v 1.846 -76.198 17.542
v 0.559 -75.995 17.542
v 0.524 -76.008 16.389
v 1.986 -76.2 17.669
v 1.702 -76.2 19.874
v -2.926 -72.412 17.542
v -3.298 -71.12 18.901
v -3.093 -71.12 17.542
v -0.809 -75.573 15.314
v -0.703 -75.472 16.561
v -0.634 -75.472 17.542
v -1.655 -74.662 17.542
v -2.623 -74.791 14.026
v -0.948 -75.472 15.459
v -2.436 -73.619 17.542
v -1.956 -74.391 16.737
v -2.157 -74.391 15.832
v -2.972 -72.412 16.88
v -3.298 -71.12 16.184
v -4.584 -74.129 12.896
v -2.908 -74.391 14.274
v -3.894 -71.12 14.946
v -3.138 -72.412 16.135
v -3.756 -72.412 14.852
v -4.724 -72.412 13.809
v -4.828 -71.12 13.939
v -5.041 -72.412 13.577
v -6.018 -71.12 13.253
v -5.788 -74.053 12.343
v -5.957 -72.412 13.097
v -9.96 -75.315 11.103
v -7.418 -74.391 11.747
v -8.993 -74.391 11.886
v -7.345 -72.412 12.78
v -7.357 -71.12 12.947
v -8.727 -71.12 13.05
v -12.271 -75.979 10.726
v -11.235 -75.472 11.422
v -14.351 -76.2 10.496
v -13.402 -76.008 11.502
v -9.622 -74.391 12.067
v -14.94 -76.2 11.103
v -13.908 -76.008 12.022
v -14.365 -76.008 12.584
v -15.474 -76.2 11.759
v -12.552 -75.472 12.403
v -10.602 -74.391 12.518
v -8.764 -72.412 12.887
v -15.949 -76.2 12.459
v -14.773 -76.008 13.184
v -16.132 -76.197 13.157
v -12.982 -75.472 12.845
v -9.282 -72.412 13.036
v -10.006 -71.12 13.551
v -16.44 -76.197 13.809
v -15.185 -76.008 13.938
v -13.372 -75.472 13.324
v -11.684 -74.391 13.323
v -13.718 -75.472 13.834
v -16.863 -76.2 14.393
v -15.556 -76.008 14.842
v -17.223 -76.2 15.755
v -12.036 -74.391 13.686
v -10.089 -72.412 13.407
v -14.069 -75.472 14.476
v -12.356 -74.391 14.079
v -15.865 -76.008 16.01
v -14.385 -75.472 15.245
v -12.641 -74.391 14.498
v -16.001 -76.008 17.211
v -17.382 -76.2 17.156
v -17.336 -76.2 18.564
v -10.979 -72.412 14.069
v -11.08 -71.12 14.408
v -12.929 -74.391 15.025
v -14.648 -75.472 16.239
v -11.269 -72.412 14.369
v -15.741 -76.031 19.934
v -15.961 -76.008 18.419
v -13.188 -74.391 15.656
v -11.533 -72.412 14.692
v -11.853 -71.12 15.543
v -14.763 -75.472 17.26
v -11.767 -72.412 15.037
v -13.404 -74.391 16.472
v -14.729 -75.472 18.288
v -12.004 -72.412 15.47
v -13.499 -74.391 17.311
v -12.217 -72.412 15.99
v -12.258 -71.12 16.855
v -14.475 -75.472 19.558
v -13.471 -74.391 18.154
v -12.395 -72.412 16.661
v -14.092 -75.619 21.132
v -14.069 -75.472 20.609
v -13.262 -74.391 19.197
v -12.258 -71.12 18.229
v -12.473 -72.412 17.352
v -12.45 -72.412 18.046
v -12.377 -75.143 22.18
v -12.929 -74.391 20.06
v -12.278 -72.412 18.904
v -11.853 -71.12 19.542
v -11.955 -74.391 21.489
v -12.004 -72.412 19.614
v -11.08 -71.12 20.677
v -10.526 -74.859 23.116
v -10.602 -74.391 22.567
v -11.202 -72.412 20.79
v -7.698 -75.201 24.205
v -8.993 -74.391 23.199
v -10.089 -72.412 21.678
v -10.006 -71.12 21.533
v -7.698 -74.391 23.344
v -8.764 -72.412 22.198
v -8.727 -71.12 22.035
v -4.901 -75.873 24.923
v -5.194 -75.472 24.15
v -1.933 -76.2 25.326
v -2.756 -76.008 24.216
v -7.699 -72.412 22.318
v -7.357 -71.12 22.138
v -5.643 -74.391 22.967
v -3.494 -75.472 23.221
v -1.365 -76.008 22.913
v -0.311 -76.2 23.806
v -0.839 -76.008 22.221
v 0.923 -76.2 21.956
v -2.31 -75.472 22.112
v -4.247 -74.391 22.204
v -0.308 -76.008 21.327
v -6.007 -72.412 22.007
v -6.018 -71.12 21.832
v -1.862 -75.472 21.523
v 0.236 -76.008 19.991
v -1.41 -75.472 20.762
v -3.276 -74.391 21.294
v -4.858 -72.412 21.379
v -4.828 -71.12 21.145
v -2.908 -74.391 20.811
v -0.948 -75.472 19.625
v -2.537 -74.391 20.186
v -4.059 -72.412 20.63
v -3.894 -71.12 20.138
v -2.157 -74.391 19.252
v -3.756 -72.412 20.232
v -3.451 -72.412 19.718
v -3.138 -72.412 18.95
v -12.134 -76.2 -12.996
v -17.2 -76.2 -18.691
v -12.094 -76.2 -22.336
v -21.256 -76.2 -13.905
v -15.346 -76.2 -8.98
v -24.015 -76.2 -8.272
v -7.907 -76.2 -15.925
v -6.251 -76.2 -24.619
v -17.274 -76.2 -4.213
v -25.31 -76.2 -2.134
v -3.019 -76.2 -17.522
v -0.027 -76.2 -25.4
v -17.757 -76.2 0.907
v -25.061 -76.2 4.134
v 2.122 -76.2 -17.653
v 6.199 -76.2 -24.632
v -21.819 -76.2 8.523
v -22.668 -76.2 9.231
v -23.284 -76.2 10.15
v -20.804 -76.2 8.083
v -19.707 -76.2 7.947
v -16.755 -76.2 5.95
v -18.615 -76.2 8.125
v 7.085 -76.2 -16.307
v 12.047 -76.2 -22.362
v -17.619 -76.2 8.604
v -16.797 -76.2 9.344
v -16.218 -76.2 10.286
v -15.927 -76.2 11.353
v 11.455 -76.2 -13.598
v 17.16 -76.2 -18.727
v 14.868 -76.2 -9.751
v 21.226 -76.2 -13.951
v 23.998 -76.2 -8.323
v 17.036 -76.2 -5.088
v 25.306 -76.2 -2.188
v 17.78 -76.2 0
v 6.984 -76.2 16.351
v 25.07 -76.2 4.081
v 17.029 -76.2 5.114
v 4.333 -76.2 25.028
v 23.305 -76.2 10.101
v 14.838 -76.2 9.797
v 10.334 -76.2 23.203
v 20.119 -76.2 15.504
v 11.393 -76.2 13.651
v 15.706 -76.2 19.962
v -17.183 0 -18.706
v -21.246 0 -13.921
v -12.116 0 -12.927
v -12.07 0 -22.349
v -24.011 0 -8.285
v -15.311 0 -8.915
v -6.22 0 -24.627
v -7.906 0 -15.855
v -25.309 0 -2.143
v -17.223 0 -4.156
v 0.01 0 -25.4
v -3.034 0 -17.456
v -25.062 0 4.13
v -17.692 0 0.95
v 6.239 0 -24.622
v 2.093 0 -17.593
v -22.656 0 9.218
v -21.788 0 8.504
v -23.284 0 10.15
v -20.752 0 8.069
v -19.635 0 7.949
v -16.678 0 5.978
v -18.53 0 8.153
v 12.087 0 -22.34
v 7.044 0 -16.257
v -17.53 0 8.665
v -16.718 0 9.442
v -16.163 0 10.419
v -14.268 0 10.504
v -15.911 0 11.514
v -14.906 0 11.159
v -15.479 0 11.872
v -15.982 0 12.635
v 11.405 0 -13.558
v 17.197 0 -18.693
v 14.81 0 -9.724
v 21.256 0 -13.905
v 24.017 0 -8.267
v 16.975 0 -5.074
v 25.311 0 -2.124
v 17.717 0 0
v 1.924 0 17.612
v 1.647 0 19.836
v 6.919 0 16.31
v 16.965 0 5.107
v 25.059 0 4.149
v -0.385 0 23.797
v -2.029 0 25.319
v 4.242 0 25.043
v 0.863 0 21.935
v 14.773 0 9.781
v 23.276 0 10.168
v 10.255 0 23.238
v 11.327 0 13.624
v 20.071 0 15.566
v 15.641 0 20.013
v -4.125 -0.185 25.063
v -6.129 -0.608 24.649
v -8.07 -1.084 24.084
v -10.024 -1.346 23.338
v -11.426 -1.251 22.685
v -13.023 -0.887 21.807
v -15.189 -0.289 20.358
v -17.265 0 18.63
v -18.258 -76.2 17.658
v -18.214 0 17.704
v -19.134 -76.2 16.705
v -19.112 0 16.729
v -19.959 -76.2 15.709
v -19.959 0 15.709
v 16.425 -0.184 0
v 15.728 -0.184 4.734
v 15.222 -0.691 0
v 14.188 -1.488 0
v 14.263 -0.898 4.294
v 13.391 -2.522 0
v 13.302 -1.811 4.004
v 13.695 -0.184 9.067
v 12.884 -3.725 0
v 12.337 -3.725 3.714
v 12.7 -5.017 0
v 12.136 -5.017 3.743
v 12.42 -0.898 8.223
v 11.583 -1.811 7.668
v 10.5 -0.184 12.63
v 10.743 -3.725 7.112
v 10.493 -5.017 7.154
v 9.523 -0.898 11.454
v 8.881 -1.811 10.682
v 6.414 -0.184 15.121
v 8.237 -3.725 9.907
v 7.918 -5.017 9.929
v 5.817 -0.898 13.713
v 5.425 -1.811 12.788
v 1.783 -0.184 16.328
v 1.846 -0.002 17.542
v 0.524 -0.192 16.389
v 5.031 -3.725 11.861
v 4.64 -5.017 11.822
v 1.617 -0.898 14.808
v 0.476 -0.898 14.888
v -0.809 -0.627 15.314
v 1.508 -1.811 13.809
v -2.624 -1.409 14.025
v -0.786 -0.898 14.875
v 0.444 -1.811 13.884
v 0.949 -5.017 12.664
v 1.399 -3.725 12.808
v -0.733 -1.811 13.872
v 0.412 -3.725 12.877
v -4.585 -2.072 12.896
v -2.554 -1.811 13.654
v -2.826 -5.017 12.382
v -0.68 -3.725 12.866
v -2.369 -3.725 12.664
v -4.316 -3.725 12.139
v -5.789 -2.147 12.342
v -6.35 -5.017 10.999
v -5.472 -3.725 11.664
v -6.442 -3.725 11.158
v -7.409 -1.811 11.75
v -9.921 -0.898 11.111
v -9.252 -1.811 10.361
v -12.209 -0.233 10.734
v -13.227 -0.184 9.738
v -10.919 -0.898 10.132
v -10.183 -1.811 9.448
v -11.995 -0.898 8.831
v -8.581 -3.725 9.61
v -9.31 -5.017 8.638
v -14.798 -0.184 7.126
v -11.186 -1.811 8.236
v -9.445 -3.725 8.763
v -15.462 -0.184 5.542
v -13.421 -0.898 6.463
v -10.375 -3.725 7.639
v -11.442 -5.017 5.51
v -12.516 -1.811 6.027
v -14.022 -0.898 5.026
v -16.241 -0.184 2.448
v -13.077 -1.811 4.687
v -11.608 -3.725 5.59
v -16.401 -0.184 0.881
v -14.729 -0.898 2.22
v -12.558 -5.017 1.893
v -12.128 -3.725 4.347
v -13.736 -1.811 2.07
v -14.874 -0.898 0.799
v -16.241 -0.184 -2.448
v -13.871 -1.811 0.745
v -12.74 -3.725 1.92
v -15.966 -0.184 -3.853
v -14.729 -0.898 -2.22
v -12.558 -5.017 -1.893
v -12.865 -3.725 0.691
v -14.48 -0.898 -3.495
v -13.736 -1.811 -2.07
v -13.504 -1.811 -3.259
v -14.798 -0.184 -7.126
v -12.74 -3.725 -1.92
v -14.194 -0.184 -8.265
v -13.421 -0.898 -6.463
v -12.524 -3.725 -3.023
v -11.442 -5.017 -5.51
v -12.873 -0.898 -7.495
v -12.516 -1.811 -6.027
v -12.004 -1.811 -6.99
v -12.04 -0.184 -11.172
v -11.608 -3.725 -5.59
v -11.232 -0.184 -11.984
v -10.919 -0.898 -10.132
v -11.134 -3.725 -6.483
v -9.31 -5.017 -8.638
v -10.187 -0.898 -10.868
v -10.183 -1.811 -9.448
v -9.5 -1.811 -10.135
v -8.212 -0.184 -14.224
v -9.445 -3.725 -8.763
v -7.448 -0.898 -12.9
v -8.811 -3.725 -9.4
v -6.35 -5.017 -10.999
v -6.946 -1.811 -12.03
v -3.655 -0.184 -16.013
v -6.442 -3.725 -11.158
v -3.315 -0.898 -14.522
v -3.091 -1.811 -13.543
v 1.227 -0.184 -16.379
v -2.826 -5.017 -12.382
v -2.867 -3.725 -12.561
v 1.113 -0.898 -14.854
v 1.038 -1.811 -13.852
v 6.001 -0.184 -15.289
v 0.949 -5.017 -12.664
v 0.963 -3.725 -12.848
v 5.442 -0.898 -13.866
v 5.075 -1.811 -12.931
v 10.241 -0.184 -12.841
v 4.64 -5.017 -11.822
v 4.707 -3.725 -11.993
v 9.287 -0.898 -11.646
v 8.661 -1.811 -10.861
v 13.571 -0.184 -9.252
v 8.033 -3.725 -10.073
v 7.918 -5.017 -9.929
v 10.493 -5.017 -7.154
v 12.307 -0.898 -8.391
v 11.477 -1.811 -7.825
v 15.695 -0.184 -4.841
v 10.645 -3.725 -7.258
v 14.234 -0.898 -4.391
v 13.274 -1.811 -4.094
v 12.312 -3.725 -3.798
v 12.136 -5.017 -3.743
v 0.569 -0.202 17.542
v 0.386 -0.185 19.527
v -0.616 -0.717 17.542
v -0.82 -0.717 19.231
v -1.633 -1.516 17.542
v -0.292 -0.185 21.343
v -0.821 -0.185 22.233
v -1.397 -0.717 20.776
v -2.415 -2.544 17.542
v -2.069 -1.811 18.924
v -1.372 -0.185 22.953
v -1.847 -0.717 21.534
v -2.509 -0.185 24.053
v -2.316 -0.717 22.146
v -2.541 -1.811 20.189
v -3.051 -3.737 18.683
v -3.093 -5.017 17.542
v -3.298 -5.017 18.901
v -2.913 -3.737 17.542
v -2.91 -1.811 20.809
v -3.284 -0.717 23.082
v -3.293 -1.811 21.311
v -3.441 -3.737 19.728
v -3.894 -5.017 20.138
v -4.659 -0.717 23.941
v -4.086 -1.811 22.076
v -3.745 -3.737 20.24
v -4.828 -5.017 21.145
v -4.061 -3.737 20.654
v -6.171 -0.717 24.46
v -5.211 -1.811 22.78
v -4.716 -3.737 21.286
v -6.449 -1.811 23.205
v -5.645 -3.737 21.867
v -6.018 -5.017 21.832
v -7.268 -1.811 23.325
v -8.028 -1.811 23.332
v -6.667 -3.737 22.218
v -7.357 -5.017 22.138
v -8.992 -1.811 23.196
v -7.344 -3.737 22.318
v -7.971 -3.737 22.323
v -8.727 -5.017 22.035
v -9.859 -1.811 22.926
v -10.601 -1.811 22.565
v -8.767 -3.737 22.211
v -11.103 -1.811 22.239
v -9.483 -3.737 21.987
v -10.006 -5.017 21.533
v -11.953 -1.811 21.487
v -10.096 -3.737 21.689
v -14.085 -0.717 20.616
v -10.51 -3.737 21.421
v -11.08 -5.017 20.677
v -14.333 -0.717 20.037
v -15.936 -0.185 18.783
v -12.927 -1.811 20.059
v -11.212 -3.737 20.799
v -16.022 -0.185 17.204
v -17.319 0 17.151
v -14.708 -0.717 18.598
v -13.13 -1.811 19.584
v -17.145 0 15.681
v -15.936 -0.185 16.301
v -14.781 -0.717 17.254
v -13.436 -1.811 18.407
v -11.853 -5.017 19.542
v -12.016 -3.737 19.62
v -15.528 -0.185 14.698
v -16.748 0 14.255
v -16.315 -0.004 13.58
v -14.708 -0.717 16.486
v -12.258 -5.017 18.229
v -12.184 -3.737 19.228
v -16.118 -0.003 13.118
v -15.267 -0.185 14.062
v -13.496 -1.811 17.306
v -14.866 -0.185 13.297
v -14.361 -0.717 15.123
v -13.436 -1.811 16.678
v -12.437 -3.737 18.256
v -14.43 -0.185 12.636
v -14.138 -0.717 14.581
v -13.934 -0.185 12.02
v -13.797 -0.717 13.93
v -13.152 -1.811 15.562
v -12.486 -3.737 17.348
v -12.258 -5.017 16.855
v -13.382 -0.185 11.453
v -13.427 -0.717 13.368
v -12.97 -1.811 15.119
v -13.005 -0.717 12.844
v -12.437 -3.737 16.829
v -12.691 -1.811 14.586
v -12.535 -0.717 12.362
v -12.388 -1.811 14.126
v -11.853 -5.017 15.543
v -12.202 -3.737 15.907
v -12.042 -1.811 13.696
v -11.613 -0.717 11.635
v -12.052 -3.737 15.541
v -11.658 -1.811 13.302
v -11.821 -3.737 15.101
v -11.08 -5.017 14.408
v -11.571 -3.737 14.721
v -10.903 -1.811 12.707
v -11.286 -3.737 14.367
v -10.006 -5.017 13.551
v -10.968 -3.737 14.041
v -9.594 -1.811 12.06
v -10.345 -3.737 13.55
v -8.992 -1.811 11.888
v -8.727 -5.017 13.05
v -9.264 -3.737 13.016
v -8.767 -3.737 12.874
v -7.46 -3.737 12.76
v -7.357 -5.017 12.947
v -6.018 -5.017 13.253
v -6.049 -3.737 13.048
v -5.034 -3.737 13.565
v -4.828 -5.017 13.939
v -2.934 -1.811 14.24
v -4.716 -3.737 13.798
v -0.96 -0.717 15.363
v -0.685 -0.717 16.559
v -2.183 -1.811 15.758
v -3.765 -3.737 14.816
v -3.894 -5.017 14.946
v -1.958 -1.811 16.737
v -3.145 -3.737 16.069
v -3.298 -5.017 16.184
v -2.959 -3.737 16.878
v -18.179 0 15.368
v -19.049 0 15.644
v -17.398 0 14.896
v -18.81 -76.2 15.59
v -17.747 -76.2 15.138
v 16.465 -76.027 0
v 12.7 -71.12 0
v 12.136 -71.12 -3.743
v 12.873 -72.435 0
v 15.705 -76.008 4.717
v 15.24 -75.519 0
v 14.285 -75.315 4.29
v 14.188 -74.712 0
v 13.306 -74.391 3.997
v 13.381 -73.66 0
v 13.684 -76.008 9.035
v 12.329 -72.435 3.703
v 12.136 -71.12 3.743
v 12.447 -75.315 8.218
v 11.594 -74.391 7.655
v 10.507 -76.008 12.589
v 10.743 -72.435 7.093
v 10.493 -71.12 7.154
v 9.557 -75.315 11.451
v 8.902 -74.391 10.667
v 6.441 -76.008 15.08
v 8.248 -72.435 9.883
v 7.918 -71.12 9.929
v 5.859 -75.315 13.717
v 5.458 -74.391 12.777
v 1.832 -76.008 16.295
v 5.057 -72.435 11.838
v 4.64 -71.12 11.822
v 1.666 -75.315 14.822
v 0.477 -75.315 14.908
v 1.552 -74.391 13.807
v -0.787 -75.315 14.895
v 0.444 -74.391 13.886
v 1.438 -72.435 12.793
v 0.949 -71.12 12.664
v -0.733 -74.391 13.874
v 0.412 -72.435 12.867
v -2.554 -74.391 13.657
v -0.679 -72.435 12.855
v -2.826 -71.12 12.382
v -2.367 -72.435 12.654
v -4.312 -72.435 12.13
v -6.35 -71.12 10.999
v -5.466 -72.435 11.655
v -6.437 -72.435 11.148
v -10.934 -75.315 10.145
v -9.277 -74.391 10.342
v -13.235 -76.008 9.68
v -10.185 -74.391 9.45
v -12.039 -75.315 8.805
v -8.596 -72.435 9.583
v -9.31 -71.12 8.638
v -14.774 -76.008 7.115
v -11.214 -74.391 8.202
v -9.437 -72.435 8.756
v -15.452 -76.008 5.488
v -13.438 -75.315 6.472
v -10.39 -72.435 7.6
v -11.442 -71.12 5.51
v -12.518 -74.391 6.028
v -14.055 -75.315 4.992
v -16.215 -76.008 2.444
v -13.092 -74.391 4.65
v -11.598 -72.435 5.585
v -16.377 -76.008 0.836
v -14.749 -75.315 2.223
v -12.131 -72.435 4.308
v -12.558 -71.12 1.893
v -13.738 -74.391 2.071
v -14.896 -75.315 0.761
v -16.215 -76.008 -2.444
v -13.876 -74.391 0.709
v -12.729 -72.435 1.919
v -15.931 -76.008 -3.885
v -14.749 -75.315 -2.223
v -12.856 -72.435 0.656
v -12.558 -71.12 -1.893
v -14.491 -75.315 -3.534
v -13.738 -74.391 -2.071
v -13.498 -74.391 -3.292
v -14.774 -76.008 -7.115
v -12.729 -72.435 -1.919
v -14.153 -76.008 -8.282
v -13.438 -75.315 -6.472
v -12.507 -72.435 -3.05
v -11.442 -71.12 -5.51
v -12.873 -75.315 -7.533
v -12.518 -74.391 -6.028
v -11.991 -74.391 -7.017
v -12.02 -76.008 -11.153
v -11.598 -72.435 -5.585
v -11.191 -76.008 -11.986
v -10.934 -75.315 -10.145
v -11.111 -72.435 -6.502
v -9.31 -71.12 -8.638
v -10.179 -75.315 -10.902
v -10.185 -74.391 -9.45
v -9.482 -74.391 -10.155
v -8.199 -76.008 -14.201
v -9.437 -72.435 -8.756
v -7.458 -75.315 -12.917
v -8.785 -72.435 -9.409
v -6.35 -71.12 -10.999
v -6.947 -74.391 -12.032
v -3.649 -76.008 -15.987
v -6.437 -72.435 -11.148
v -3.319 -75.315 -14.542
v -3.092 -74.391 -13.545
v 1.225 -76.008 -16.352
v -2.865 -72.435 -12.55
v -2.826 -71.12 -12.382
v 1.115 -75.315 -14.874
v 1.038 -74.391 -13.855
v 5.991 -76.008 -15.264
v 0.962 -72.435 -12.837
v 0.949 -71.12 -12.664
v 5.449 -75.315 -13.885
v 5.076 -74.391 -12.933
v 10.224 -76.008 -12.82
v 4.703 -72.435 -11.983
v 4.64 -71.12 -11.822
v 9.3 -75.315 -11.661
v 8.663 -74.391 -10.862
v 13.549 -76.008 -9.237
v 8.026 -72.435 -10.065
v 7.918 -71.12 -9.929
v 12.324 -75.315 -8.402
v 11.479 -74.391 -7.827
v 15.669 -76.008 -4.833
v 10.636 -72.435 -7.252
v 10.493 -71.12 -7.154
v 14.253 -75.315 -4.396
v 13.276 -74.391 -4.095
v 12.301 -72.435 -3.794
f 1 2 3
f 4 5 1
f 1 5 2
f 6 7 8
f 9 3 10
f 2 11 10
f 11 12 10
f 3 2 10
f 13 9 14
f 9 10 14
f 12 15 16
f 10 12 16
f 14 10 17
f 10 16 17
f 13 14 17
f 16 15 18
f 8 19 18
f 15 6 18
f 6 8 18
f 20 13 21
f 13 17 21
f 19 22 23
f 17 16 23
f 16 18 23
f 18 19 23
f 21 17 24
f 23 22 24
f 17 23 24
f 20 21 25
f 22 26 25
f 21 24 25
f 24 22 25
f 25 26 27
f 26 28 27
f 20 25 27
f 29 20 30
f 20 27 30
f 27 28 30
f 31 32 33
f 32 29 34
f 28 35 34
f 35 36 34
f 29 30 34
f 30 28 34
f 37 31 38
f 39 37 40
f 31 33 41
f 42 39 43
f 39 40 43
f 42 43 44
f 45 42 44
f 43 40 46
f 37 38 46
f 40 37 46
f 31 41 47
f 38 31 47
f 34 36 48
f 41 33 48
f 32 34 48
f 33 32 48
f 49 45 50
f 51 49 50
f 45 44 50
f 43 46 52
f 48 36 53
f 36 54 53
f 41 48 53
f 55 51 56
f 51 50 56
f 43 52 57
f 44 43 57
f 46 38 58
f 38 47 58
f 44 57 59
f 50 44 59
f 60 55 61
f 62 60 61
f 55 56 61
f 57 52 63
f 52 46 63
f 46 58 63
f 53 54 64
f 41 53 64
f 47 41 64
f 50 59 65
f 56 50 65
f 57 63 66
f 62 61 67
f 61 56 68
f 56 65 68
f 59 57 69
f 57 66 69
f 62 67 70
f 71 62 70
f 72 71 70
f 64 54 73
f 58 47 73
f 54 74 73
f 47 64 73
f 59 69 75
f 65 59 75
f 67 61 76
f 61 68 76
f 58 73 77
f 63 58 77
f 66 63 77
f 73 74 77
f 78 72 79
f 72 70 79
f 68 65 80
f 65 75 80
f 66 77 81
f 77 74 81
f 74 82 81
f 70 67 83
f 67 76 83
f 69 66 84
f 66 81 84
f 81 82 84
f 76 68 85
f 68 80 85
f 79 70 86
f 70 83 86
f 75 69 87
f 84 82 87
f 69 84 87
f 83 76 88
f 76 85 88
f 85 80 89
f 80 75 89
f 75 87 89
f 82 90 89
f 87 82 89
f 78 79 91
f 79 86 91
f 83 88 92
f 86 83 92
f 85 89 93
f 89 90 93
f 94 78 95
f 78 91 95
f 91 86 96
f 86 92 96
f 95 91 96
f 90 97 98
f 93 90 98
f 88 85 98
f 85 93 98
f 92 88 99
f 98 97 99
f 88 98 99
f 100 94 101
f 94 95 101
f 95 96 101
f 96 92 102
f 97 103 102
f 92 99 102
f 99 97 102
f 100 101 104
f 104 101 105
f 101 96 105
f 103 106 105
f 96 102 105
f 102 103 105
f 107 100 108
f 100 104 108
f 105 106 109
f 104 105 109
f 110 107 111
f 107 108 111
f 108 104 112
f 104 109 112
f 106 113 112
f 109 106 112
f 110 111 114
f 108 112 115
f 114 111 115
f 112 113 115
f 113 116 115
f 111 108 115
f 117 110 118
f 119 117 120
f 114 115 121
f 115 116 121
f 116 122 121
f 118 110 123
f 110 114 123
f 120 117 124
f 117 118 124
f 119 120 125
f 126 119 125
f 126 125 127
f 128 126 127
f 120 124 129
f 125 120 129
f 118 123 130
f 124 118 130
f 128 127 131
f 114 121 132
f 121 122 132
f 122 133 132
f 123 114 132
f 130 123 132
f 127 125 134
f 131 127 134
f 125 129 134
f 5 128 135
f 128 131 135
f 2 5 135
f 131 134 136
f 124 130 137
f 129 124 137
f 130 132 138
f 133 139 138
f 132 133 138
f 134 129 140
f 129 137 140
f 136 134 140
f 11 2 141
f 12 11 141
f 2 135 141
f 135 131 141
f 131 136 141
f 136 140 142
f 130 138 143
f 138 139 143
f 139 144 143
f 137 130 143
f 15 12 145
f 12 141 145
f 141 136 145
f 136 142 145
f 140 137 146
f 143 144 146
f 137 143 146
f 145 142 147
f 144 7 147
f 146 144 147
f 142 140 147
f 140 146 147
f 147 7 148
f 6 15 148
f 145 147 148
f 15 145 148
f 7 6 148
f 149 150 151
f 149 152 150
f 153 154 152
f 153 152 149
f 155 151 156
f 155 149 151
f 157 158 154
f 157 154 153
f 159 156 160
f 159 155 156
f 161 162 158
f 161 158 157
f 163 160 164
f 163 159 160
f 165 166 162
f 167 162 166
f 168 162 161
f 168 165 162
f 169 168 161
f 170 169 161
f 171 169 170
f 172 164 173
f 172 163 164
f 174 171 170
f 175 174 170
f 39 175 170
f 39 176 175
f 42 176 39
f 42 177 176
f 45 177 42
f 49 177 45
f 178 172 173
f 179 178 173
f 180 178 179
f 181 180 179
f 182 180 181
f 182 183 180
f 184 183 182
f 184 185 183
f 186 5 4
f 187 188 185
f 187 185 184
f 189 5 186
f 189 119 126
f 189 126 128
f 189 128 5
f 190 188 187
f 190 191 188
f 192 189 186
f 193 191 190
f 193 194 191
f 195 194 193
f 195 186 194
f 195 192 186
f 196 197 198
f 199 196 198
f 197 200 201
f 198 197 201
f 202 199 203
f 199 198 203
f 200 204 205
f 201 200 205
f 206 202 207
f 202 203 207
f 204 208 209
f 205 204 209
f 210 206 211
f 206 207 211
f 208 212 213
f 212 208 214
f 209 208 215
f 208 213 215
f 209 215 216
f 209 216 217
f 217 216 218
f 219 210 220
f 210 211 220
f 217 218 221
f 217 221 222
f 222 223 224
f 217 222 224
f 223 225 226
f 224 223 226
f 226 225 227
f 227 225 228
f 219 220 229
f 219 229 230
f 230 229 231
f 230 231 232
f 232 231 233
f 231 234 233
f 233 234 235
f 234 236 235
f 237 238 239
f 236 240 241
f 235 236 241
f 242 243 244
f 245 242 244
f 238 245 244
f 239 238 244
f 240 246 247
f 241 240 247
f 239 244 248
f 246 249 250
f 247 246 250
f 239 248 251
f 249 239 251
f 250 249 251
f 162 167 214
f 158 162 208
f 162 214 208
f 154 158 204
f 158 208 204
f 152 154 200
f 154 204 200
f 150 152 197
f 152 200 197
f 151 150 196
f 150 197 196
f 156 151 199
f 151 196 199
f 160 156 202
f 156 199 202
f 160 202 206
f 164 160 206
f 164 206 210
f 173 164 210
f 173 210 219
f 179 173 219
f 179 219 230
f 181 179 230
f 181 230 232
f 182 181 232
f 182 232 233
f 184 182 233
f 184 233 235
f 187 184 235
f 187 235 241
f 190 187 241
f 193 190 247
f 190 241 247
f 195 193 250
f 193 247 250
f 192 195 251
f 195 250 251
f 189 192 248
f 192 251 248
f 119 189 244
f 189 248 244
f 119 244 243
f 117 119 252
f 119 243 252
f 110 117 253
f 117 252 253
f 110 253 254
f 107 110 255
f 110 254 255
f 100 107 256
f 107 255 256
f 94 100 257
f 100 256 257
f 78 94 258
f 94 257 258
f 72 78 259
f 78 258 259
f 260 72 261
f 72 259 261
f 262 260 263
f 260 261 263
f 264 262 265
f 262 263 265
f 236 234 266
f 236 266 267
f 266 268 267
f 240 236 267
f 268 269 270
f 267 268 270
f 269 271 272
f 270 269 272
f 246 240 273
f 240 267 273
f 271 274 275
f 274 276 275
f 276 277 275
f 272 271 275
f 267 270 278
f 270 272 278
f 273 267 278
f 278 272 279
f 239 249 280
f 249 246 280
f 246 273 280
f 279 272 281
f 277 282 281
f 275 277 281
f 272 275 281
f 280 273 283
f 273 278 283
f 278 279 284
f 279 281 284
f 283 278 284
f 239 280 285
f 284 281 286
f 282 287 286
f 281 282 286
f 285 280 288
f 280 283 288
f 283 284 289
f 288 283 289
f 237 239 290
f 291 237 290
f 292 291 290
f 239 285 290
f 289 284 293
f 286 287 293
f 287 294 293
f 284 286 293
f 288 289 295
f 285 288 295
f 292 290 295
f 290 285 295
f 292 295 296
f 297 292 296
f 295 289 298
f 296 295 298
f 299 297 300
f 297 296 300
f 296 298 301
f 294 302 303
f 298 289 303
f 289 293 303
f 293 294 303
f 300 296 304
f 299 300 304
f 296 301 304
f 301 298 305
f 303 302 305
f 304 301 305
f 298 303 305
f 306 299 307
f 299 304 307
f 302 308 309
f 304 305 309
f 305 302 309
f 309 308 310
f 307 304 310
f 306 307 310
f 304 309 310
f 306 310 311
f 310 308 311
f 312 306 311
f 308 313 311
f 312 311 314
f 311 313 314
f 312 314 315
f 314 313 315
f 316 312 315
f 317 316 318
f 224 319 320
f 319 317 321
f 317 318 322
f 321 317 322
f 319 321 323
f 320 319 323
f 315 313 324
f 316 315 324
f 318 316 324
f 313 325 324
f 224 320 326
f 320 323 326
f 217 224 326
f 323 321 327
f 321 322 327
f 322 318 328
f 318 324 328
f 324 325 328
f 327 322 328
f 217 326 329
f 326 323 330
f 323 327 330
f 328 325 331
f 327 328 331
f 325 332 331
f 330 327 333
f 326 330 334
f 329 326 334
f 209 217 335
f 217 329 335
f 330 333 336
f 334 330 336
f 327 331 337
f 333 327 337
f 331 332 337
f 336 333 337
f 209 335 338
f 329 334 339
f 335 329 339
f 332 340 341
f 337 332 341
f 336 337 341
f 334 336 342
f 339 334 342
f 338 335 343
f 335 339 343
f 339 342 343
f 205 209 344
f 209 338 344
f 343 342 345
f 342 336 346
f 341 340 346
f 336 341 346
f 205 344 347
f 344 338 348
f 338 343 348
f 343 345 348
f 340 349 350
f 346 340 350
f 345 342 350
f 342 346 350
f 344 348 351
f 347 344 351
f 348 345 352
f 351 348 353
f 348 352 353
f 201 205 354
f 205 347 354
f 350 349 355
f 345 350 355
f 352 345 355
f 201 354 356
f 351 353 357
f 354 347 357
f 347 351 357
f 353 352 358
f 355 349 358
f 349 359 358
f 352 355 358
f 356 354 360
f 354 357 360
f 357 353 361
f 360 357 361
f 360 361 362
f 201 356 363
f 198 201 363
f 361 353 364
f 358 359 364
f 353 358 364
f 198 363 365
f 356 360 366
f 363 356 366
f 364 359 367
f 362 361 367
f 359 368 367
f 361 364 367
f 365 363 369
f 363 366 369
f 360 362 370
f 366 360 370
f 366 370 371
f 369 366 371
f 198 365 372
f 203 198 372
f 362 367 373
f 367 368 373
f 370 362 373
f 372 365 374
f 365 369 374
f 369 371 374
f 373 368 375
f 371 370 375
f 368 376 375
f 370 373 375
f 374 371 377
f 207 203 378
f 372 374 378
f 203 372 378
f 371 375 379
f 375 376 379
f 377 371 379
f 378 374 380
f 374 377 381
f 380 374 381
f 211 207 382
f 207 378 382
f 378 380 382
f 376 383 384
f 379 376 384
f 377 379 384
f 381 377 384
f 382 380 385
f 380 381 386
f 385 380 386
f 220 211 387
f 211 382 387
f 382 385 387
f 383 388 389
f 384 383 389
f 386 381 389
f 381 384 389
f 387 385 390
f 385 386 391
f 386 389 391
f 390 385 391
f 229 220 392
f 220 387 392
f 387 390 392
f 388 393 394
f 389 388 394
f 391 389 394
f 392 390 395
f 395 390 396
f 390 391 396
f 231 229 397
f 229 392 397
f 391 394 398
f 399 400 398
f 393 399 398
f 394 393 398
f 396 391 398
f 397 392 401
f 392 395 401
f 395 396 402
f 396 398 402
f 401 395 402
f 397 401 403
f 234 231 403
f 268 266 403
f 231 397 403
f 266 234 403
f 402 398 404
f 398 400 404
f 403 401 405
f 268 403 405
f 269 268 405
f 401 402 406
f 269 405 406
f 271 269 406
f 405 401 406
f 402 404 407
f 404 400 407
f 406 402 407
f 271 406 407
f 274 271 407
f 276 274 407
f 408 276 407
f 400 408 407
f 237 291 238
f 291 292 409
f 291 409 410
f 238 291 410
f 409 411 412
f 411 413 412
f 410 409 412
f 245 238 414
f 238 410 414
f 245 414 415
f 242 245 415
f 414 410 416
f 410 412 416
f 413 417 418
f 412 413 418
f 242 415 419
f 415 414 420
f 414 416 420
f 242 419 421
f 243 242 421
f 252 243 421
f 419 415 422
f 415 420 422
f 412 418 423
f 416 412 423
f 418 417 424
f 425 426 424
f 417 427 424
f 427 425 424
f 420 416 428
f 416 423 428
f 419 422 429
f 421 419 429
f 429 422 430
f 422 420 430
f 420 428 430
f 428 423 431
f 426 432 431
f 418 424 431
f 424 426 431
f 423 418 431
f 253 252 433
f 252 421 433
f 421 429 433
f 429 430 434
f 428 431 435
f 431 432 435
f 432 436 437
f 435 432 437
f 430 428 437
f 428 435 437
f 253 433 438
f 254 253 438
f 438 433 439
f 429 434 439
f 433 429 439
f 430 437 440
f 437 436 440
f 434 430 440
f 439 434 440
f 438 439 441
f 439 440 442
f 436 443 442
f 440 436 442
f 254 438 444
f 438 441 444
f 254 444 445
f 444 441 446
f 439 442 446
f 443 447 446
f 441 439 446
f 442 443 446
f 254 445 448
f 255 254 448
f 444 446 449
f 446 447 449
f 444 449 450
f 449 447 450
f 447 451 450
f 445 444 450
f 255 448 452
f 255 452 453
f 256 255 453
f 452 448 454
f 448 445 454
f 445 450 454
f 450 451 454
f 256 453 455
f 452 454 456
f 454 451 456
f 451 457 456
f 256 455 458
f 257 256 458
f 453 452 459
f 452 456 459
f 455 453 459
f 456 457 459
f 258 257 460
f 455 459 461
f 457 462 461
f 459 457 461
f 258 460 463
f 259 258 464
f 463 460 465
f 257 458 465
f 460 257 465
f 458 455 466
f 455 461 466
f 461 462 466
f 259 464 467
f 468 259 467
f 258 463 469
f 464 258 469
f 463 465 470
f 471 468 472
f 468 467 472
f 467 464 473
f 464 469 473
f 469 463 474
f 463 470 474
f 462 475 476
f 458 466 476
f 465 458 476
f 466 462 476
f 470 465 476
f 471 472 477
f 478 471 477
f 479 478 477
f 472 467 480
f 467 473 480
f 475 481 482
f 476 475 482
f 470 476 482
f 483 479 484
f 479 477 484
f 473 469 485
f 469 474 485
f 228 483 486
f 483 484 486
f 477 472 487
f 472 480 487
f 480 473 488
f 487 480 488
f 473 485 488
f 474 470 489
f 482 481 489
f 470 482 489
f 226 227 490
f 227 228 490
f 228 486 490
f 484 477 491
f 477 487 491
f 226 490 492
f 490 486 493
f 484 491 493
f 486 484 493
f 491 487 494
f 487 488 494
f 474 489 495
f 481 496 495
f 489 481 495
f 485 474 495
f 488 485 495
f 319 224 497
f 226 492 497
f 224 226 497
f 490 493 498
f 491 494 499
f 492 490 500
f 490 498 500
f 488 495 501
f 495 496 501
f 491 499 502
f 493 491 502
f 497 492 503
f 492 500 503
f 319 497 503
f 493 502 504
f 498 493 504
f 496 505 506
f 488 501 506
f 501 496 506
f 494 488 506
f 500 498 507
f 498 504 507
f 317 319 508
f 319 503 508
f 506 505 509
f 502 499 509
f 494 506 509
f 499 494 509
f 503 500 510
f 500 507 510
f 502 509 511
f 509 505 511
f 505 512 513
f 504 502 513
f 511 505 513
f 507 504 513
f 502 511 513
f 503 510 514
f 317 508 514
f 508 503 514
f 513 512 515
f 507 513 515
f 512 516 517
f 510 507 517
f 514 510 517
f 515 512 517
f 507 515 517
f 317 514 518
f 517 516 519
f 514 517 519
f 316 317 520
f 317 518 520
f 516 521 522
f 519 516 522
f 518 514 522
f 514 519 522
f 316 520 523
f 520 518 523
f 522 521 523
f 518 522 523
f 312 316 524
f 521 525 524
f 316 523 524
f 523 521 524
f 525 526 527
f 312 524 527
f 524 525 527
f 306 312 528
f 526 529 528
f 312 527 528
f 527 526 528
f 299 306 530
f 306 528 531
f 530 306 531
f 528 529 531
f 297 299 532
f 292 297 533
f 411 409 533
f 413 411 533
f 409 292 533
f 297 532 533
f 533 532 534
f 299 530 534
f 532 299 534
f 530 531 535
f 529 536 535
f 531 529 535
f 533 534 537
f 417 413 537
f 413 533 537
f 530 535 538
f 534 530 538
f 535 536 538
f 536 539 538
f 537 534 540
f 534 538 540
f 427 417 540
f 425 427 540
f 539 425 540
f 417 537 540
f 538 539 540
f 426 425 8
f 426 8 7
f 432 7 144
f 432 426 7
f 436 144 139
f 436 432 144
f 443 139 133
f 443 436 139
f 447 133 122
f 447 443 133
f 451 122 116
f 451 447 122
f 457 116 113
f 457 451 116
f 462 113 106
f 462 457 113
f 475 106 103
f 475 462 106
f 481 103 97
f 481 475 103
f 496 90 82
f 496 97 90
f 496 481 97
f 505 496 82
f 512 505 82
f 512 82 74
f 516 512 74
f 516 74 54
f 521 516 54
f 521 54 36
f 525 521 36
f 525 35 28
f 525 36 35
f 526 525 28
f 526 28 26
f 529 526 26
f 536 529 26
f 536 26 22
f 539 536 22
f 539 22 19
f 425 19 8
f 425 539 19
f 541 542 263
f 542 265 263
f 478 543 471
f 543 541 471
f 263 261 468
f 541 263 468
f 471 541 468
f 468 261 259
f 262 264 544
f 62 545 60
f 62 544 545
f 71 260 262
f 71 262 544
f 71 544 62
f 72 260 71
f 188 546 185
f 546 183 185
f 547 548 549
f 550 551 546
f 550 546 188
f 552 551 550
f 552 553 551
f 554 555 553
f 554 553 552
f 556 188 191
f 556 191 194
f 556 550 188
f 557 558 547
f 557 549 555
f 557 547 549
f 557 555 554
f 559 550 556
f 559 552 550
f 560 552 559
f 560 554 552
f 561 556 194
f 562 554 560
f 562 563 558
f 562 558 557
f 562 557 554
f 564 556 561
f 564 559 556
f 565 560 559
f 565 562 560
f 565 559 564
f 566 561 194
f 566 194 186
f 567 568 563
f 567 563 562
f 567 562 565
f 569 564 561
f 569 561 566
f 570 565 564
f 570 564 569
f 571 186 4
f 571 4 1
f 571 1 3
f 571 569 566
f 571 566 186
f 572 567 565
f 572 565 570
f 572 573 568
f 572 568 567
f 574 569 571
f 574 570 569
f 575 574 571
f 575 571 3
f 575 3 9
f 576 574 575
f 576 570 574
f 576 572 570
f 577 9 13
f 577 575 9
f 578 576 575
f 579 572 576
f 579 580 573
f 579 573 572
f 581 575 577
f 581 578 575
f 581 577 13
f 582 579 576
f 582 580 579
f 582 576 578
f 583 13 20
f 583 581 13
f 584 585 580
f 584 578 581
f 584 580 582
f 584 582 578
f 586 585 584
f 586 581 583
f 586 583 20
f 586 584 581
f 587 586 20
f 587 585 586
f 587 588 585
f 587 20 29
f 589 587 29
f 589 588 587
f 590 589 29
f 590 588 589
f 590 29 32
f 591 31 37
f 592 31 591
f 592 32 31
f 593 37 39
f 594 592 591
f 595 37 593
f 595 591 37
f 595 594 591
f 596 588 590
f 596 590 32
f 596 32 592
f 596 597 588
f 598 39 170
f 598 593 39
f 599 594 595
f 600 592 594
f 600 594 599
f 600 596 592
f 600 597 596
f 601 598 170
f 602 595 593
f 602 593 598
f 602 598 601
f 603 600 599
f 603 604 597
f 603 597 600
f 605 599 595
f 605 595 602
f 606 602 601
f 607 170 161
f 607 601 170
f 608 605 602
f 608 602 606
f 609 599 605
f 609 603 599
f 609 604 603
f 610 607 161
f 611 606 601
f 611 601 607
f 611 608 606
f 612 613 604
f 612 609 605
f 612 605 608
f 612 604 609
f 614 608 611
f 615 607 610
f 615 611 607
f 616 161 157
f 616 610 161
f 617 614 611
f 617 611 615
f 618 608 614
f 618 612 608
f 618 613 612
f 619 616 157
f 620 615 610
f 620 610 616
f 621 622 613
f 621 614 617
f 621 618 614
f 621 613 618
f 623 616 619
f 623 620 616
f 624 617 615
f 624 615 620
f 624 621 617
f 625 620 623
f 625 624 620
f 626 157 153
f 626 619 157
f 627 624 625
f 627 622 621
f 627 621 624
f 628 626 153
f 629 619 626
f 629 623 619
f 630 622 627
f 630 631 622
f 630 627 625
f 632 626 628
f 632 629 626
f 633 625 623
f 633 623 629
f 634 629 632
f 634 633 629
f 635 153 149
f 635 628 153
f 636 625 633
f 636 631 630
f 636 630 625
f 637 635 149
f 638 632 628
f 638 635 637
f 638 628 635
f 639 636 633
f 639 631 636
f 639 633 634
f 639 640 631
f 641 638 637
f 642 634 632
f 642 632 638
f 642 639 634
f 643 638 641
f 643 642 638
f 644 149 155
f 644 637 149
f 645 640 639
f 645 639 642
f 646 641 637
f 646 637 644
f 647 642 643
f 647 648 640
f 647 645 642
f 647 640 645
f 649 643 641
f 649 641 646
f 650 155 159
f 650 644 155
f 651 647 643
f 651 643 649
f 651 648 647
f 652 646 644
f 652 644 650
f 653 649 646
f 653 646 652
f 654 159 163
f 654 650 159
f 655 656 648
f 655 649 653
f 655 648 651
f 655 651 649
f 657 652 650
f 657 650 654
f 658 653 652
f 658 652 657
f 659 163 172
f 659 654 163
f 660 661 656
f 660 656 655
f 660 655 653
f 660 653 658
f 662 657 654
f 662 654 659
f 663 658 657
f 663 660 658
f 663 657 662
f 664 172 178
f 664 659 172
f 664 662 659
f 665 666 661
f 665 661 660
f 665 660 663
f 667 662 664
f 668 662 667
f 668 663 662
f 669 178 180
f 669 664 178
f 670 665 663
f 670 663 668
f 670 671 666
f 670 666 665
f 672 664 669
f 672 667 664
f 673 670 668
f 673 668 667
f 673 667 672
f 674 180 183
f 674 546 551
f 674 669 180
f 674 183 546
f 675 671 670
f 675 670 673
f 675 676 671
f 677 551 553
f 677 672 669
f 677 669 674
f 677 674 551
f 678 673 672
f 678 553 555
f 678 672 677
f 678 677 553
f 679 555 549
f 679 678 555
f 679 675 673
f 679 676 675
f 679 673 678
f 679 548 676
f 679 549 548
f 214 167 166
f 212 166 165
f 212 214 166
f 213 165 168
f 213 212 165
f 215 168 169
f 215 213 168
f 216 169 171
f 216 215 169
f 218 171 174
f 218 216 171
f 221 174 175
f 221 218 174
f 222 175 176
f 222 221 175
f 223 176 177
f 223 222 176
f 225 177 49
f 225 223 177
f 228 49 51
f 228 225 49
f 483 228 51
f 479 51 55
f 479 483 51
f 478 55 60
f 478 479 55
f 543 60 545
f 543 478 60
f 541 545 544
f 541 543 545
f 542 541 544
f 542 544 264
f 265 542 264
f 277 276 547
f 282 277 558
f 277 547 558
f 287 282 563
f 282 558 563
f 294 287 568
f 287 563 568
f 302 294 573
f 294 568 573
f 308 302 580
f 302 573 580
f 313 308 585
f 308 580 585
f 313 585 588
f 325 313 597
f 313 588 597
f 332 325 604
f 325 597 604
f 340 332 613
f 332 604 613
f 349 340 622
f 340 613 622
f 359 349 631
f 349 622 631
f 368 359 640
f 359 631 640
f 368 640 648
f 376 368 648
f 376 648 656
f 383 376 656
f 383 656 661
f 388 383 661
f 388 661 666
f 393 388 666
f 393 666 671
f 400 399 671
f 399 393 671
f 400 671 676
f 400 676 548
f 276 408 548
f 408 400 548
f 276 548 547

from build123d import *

# Parameters (mm, degrees)
F0_R     = 25.4
F1_DEPTH = 76.2
F2_R     = 12.7
F3_DEPTH = 105.41
F4_R     = 3.8838784961
F5_DEPTH = 133.35
F6_R     = 4.6082025667
F7_DEPTH = 145.542


# Not quite as in the source:
# - a fillet or chamfer that OpenCascade refuses, or shapes differently, is made with other operations: its cross-section is extruded or revolved along the edge and cut away or added


with BuildPart() as f1:
    # F0 (on Front) → F1 (new body)
    with BuildSketch(Plane.XZ):
        Circle(F0_R)
    extrude(amount=F1_DEPTH)

    # F2 (on face) → F3 (cut)
    with BuildSketch(Plane.XZ.offset(76.2)):
        Circle(F2_R)
    extrude(amount=-F3_DEPTH, mode=Mode.SUBTRACT)

    # F4 (on Front) → F5 (cut)
    with BuildSketch(Plane.XZ):
        with Locations((-19.7816453874, 11.8296807632)):
            Circle(F4_R)
    extrude(amount=F5_DEPTH, mode=Mode.SUBTRACT)

    # F6 (on Front) → F7 (cut)
    with BuildSketch(Plane.XZ):
        with Locations((-7.7014984563, 17.5422988832)):
            Circle(F6_R)
    extrude(amount=F7_DEPTH, mode=Mode.SUBTRACT)

    # F8: fillet of radius 5.08 on 2 edges, made by hand

    # F8_s1 → F8_t2 (revolve, cut)
    with BuildSketch(Plane.XY):
        with BuildLine():
            ThreePointArc((17.78, -76.2), (14.1878975516, -74.7121024484), (12.7, -71.12))
            Line((12.7, -71.12), (12.7, -76.2))
            Line((12.7, -76.2), (17.78, -76.2))
        make_face()
    revolve(axis=Axis((0, -76.2, 0), (0, -1, 0)), mode=Mode.SUBTRACT)

    # F8_s3 → F8_t4 (revolve, cut)
    with BuildSketch(Plane.XY.offset(17.5422988832)):
        with BuildLine():
            ThreePointArc((1.9867041104, -76.2), (-1.605398338, -74.7121024484), (-3.0932958896, -71.12))
            Line((-3.0932958896, -71.12), (-3.0932958896, -76.2))
            Line((-3.0932958896, -76.2), (1.9867041104, -76.2))
        make_face()
    revolve(axis=Axis((-7.7014984563, -76.2, 17.5422988832), (0, 1, 0)), mode=Mode.SUBTRACT)

    # F9: fillet of radius 5.08 on 2 edges, made by hand

    # F9_s1 → F9_t2 (revolve, cut)
    with BuildSketch(Plane.XY):
        with BuildLine():
            ThreePointArc((17.7809656854, 0.0004), (14.1878975516, -1.4878975516), (12.6996, -5.0809656854))
            Line((12.6996, -5.0809656854), (12.1914634315, -5.0809656854))
            ThreePointArc((12.1914634315, -5.0809656854), (12.1918634315, -2.5404828427), (12.1918634315, 0))
            Line((12.1918634315, 0), (12.7, 0.5081365685))
            ThreePointArc((12.7, 0.5081365685), (15.2404828427, 0.5081365685), (17.7809656854, 0.5085365685))
            Line((17.7809656854, 0.5085365685), (17.7809656854, 0.0004))
        make_face()
    revolve(axis=Axis((0, 0, 0), (0, -1, 0)), mode=Mode.SUBTRACT)

    # F9_s3 → F9_t4 (revolve, cut)
    with BuildSketch(Plane.XY.offset(17.5422988832)):
        with BuildLine():
            ThreePointArc((1.9876697958, 0.0004), (-1.605398338, -1.4878975516), (-3.0936958896, -5.0809656854))
            Line((-3.0936958896, -5.0809656854), (-3.6018324581, -5.0809656854))
            ThreePointArc((-3.6018324581, -5.0809656854), (-3.6014324581, -2.5404828427), (-3.6014324581, 0))
            Line((-3.6014324581, 0), (-3.0932958896, 0.5081365685))
            ThreePointArc((-3.0932958896, 0.5081365685), (-0.5528130469, 0.5081365685), (1.9876697958, 0.5085365685))
            Line((1.9876697958, 0.5085365685), (1.9876697958, 0.0004))
        make_face()
    revolve(axis=Axis((-7.7014984563, 0, 17.5422988832), (0, -1, 0)), mode=Mode.SUBTRACT)


solid = f1.part
